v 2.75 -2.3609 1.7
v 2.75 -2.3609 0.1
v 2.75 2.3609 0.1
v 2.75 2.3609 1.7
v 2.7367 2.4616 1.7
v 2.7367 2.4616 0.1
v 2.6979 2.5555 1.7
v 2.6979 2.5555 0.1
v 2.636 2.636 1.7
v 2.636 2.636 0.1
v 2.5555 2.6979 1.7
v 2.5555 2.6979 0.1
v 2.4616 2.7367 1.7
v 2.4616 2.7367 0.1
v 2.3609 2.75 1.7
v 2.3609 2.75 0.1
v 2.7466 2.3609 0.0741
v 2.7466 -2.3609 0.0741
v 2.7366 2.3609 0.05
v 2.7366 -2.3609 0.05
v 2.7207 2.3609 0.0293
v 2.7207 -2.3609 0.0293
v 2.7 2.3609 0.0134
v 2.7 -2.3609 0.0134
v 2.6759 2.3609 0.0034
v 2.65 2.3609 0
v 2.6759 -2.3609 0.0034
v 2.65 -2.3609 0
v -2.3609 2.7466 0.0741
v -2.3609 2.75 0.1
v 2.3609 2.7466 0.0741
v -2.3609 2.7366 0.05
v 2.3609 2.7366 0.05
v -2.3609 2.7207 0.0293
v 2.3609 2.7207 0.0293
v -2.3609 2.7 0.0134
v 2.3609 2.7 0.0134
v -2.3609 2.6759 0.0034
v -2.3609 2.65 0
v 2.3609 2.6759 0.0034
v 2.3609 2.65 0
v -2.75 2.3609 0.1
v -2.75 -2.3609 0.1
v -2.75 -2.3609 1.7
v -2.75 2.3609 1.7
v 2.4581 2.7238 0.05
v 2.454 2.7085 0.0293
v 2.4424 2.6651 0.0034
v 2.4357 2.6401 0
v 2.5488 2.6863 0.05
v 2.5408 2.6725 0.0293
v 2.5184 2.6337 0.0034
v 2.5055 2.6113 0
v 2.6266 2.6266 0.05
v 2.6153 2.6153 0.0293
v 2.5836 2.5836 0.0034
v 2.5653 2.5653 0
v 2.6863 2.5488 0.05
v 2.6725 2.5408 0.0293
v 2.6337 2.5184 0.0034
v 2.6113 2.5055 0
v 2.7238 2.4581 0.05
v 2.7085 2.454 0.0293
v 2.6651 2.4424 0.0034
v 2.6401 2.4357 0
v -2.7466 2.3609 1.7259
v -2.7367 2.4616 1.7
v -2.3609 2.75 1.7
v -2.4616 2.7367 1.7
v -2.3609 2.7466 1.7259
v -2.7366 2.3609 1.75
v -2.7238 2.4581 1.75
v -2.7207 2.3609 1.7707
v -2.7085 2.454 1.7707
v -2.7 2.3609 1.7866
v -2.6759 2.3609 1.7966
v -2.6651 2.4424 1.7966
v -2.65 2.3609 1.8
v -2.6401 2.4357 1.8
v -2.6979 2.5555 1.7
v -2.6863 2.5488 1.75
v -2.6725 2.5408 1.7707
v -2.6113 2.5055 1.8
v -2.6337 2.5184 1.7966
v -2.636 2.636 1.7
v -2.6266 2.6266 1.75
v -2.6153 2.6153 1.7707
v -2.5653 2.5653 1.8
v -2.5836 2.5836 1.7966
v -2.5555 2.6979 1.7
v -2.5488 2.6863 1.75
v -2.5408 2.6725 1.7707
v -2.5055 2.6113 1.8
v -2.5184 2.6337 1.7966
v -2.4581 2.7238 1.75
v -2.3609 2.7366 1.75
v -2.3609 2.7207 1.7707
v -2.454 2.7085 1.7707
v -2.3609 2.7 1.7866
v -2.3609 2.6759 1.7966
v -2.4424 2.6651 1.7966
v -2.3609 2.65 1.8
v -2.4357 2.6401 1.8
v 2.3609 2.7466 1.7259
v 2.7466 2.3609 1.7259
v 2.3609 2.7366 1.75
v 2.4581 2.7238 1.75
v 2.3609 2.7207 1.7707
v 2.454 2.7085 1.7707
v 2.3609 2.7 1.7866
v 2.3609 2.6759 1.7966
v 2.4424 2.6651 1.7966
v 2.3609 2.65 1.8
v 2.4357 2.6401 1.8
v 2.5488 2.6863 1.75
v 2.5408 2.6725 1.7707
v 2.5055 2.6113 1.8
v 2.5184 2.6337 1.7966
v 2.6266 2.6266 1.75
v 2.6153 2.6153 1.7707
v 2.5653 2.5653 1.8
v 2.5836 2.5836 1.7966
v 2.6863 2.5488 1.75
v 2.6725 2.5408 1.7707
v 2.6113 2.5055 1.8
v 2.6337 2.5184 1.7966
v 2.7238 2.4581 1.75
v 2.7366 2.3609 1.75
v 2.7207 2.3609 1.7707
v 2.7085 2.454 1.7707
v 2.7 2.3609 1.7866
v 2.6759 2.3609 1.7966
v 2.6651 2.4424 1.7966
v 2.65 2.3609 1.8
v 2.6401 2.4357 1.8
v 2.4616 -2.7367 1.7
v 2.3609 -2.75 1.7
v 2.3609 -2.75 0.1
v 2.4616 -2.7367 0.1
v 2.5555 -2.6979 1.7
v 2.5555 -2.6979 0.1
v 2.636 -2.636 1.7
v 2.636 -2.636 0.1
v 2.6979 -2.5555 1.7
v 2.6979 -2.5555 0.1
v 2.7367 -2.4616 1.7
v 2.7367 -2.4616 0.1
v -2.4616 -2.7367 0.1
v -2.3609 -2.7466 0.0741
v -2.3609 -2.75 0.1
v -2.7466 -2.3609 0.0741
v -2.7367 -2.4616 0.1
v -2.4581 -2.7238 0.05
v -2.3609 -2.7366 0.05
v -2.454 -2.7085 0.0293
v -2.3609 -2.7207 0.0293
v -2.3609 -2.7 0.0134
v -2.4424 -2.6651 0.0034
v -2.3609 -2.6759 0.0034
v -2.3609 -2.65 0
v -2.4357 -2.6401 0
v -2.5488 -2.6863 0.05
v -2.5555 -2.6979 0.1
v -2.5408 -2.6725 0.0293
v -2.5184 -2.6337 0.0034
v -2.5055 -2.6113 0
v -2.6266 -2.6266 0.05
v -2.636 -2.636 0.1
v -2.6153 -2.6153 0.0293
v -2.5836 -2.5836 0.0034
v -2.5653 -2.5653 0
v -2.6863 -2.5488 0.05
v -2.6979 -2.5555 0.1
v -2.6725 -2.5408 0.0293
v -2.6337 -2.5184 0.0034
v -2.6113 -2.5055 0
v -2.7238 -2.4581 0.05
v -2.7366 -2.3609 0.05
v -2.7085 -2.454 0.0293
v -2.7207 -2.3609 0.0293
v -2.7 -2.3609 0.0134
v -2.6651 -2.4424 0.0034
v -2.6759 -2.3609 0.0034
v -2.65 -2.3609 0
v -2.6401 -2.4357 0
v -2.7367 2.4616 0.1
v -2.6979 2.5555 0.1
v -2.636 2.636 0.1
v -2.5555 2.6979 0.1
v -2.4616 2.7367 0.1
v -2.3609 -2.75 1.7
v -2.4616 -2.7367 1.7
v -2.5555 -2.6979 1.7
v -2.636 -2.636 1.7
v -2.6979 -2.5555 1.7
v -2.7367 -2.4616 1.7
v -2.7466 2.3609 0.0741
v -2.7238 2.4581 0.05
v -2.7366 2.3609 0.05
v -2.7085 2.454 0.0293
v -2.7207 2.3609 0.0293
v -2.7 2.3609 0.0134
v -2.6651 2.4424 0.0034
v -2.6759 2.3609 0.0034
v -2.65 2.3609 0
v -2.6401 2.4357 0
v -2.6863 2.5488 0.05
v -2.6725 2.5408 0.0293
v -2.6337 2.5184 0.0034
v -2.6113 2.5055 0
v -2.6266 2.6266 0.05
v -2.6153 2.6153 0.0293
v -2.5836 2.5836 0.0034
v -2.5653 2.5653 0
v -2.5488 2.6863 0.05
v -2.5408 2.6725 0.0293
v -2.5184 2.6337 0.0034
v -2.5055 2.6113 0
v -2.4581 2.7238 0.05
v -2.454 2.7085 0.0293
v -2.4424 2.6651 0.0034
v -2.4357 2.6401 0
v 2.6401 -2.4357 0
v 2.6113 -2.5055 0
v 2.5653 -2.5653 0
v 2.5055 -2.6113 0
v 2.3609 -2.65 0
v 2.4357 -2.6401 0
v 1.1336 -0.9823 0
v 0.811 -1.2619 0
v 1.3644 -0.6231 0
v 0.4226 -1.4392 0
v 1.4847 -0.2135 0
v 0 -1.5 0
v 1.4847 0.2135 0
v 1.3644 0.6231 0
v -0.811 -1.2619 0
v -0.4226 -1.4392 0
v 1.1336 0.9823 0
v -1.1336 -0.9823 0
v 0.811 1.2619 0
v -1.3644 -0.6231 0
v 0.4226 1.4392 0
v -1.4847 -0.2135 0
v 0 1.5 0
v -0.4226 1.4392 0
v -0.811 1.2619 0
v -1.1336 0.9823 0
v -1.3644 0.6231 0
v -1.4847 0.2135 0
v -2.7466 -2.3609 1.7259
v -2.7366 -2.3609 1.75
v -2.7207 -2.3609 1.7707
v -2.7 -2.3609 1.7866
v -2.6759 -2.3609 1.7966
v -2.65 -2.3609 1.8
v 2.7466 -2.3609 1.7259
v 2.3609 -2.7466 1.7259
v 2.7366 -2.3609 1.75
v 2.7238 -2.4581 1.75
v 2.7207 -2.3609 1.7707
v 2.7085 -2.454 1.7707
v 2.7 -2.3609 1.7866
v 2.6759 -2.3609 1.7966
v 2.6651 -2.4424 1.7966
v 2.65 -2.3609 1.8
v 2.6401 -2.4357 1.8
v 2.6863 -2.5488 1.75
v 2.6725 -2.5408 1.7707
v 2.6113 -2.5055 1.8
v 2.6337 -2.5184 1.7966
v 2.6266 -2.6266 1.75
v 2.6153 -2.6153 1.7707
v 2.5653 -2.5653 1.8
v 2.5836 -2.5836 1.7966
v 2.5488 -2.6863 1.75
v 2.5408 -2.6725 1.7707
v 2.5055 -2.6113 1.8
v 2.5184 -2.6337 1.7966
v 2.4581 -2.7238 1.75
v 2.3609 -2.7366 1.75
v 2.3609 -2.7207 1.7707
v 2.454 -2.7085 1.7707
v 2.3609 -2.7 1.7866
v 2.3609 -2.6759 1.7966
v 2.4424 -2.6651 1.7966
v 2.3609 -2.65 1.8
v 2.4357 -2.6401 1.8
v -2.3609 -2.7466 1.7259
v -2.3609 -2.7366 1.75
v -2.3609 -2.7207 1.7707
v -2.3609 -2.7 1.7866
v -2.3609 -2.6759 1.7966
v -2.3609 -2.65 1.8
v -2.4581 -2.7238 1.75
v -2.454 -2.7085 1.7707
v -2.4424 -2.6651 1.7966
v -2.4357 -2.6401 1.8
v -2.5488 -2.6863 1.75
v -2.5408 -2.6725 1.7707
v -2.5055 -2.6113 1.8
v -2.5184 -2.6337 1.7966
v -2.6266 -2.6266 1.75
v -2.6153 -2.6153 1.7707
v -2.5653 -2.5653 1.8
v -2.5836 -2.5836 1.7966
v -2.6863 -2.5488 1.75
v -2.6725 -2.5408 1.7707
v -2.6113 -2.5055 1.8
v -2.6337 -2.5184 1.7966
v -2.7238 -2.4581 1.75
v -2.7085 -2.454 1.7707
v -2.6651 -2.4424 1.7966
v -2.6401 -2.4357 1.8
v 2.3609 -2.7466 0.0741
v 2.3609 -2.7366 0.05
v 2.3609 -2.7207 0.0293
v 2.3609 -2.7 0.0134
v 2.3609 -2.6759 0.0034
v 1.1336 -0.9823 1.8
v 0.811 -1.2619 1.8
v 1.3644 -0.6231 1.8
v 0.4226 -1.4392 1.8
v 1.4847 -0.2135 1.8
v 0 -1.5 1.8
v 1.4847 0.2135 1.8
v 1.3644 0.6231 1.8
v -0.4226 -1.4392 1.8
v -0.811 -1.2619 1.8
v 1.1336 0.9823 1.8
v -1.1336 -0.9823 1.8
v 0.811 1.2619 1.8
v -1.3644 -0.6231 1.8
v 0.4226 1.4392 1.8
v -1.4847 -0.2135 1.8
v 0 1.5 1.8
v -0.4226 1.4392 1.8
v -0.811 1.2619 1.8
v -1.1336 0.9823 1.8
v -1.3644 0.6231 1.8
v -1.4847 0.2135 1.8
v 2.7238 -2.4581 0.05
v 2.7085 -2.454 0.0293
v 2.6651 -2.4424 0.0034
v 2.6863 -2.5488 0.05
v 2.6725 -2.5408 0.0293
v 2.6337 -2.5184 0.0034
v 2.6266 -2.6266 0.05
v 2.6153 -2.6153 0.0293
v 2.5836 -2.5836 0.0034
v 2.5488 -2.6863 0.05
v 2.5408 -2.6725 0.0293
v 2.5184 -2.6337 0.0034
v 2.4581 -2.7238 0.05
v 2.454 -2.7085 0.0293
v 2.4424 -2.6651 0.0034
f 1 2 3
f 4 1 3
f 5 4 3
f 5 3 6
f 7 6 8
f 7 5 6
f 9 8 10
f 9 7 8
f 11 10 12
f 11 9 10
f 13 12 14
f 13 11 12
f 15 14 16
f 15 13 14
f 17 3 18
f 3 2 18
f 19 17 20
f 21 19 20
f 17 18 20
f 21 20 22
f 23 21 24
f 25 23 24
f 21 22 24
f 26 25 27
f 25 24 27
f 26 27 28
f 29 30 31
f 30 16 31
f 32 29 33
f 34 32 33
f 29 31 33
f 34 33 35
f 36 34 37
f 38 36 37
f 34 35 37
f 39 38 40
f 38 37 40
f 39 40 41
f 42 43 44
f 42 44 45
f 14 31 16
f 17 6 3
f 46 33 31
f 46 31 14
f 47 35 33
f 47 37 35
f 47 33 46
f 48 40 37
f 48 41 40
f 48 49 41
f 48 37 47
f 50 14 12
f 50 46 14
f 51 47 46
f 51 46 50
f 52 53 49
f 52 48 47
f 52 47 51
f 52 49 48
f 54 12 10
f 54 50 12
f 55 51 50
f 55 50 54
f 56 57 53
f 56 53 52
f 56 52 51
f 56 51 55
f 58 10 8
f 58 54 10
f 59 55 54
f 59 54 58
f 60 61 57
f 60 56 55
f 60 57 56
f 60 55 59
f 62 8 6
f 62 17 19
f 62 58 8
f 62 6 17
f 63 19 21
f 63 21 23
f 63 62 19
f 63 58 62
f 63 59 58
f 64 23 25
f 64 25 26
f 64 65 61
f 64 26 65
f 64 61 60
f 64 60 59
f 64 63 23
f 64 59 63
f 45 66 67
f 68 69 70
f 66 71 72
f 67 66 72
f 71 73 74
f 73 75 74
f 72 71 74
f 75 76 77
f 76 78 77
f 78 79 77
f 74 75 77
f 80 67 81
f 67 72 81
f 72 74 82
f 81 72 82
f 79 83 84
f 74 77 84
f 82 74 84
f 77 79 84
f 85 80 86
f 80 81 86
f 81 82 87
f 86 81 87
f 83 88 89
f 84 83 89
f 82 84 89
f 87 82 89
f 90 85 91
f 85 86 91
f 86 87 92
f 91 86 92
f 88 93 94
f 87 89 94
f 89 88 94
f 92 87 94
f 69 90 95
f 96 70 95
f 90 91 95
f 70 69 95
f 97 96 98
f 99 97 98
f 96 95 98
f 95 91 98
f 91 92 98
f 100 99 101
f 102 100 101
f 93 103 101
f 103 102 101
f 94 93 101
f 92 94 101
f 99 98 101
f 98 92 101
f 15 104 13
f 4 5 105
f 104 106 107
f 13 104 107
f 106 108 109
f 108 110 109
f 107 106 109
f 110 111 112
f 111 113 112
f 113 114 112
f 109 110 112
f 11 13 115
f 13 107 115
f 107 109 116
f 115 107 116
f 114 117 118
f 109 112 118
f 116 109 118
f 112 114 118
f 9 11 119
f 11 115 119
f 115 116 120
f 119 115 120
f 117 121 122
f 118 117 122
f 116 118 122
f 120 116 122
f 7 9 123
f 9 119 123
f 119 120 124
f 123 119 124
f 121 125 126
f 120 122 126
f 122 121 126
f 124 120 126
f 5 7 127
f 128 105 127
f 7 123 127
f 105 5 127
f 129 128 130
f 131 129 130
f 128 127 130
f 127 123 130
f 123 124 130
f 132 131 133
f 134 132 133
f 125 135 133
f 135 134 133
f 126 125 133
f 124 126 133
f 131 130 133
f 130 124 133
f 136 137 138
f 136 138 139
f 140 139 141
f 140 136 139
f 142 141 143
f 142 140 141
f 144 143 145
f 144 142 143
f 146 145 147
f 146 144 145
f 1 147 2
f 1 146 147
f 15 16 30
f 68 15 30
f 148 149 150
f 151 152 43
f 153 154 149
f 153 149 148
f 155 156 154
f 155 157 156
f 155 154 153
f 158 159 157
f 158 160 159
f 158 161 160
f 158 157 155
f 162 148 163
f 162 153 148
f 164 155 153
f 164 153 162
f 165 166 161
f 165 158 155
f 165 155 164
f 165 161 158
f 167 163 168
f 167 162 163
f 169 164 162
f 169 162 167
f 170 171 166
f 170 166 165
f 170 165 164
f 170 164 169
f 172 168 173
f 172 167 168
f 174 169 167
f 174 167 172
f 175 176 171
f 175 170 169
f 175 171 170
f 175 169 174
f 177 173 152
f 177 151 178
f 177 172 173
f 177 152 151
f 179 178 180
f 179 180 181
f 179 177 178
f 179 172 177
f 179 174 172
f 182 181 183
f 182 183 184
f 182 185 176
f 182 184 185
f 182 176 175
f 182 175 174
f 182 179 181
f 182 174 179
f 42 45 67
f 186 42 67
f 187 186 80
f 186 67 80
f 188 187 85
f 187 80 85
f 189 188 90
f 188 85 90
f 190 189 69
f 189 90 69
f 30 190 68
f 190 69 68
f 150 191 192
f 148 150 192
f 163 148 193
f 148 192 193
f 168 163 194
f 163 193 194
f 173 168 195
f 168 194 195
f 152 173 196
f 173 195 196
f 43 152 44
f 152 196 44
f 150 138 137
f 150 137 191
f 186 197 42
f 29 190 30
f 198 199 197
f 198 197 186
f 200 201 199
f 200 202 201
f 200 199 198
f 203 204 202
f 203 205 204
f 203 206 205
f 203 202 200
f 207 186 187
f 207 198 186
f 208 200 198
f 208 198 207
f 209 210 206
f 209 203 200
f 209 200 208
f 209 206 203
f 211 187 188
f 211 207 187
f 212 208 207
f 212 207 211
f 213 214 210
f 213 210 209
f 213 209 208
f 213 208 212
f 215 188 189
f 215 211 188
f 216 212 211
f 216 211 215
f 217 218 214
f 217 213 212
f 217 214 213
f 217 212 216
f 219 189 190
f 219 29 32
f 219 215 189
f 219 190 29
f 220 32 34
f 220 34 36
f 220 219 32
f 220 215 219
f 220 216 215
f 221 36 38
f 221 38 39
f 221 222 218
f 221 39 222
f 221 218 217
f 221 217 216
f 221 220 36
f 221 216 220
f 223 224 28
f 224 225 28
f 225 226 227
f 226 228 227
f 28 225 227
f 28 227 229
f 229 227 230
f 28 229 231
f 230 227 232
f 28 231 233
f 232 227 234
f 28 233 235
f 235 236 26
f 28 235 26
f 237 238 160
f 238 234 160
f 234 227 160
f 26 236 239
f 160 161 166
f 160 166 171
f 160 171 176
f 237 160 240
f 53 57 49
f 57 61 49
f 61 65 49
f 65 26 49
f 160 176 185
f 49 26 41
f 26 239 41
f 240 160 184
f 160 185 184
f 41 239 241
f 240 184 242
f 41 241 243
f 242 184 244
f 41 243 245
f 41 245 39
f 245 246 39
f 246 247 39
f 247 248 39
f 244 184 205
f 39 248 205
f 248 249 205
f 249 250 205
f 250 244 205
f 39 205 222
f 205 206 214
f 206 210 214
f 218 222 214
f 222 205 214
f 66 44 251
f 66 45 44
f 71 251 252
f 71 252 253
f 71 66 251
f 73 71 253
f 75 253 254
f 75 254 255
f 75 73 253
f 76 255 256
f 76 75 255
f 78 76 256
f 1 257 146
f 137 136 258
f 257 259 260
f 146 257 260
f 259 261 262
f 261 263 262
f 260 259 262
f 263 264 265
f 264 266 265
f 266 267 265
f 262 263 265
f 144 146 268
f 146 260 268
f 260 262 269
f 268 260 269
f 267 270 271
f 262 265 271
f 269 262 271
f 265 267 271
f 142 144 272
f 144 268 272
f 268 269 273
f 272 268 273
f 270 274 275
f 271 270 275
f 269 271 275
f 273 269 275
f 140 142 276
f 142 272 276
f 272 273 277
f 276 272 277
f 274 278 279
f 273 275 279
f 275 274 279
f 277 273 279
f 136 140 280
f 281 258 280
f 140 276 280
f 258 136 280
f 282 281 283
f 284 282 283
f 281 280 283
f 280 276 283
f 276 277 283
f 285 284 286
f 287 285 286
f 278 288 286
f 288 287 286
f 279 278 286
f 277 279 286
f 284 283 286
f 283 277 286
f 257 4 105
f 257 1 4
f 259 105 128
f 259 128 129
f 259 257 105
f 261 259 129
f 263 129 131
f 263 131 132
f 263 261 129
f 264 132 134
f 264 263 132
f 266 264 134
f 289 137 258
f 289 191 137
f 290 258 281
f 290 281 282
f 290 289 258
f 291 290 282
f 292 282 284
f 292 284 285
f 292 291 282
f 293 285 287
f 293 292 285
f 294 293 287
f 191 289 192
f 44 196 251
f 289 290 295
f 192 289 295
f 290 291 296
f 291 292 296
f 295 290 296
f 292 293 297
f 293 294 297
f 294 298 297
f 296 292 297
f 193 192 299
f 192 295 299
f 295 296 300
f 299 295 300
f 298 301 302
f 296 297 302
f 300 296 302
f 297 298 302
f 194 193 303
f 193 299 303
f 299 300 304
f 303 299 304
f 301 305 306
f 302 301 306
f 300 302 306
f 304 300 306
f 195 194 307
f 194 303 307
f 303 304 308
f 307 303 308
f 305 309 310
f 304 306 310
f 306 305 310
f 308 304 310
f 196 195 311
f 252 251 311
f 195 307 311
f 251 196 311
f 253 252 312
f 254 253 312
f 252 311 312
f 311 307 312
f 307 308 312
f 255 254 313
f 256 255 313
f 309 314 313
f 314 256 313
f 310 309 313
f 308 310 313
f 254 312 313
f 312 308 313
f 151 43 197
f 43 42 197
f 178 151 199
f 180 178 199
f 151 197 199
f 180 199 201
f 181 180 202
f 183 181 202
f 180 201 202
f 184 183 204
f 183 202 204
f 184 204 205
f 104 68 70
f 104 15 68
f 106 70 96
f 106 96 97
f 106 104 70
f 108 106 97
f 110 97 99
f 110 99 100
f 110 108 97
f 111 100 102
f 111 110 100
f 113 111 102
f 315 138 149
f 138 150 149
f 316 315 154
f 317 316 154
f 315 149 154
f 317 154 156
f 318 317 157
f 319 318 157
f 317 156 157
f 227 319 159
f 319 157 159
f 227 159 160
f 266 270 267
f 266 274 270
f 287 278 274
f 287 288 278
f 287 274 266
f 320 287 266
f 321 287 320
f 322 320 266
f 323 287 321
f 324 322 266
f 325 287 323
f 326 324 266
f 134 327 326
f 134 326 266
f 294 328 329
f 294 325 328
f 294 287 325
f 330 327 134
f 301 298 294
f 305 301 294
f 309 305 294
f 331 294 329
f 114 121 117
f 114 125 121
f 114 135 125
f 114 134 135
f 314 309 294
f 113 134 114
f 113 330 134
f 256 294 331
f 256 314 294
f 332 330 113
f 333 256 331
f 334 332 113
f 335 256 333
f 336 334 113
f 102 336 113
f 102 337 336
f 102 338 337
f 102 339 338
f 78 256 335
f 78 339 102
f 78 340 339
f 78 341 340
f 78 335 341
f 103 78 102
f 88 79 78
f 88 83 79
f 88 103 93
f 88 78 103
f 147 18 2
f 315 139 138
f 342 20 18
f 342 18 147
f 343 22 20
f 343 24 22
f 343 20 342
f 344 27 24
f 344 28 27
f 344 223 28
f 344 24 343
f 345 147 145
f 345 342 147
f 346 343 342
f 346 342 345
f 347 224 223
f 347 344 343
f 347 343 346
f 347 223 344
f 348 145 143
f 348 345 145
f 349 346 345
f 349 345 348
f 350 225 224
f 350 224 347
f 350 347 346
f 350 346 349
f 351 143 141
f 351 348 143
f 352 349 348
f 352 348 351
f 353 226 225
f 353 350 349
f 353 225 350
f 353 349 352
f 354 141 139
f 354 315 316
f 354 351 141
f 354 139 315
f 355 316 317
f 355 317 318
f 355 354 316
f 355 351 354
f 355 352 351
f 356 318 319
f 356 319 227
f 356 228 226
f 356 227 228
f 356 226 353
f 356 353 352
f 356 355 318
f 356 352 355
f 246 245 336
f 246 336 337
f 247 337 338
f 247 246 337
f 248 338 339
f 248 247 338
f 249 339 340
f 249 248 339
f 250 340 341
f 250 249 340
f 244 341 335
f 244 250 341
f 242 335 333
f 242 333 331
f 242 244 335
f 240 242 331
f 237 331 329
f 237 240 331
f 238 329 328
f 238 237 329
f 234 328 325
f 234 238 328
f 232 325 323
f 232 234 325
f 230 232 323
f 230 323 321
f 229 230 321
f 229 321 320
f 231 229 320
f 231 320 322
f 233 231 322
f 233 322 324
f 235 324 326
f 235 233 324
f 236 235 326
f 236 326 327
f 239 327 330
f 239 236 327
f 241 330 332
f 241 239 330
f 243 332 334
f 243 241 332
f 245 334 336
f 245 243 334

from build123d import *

# Parameters (mm, degrees)
SKETCH1_W           = 5.5
SKETCH1_H           = 5.5
SKETCH1_R           = 1.5
BOSS_EXTRUDE1_DEPTH = 1.8
FILLET1_R           = 0.389087297
FILLET2_R           = 0.1


with BuildPart() as part:
    # Sketch1 → Boss-Extrude1 (new body)
    with BuildSketch(Plane(origin=(0, 0, 0), x_dir=(0, 1, 0), z_dir=(0, 0, 1))):
        Rectangle(SKETCH1_W, SKETCH1_H)
        Circle(SKETCH1_R, mode=Mode.SUBTRACT)
    extrude(amount=BOSS_EXTRUDE1_DEPTH)

    # Fillet1
    fillet1_edges = [part.edges().sort_by_distance(p)[0] for p in [
        (2.75, 2.75, 0.9),
        (2.75, -2.75, 0.9),
        (-2.75, -2.75, 0.9),
        (-2.75, 2.75, 0.9),
    ]]
    fillet(fillet1_edges, radius=FILLET1_R)

    # Fillet2
    fillet2_edges = [part.edges().sort_by_distance(p)[0] for p in [
        (0, -2.75, 0),
        (0, -2.75, 1.8),
        (0, 2.75, 0),
        (2.75, 0, 0),
        (-2.75, 0, 0),
        (2.636038969, -2.636038969, 0),
        (2.636038969, 2.636038969, 0),
        (-2.636038969, 2.636038969, 0),
        (-2.636038969, -2.636038969, 0),
        (-2.75, 0, 1.8),
        (0, 2.75, 1.8),
        (2.75, 0, 1.8),
        (2.636038969, -2.636038969, 1.8),
        (2.636038969, 2.636038969, 1.8),
        (-2.636038969, 2.636038969, 1.8),
        (-2.636038969, -2.636038969, 1.8),
    ]]
    fillet(fillet2_edges, radius=FILLET2_R)


solid = part.part
